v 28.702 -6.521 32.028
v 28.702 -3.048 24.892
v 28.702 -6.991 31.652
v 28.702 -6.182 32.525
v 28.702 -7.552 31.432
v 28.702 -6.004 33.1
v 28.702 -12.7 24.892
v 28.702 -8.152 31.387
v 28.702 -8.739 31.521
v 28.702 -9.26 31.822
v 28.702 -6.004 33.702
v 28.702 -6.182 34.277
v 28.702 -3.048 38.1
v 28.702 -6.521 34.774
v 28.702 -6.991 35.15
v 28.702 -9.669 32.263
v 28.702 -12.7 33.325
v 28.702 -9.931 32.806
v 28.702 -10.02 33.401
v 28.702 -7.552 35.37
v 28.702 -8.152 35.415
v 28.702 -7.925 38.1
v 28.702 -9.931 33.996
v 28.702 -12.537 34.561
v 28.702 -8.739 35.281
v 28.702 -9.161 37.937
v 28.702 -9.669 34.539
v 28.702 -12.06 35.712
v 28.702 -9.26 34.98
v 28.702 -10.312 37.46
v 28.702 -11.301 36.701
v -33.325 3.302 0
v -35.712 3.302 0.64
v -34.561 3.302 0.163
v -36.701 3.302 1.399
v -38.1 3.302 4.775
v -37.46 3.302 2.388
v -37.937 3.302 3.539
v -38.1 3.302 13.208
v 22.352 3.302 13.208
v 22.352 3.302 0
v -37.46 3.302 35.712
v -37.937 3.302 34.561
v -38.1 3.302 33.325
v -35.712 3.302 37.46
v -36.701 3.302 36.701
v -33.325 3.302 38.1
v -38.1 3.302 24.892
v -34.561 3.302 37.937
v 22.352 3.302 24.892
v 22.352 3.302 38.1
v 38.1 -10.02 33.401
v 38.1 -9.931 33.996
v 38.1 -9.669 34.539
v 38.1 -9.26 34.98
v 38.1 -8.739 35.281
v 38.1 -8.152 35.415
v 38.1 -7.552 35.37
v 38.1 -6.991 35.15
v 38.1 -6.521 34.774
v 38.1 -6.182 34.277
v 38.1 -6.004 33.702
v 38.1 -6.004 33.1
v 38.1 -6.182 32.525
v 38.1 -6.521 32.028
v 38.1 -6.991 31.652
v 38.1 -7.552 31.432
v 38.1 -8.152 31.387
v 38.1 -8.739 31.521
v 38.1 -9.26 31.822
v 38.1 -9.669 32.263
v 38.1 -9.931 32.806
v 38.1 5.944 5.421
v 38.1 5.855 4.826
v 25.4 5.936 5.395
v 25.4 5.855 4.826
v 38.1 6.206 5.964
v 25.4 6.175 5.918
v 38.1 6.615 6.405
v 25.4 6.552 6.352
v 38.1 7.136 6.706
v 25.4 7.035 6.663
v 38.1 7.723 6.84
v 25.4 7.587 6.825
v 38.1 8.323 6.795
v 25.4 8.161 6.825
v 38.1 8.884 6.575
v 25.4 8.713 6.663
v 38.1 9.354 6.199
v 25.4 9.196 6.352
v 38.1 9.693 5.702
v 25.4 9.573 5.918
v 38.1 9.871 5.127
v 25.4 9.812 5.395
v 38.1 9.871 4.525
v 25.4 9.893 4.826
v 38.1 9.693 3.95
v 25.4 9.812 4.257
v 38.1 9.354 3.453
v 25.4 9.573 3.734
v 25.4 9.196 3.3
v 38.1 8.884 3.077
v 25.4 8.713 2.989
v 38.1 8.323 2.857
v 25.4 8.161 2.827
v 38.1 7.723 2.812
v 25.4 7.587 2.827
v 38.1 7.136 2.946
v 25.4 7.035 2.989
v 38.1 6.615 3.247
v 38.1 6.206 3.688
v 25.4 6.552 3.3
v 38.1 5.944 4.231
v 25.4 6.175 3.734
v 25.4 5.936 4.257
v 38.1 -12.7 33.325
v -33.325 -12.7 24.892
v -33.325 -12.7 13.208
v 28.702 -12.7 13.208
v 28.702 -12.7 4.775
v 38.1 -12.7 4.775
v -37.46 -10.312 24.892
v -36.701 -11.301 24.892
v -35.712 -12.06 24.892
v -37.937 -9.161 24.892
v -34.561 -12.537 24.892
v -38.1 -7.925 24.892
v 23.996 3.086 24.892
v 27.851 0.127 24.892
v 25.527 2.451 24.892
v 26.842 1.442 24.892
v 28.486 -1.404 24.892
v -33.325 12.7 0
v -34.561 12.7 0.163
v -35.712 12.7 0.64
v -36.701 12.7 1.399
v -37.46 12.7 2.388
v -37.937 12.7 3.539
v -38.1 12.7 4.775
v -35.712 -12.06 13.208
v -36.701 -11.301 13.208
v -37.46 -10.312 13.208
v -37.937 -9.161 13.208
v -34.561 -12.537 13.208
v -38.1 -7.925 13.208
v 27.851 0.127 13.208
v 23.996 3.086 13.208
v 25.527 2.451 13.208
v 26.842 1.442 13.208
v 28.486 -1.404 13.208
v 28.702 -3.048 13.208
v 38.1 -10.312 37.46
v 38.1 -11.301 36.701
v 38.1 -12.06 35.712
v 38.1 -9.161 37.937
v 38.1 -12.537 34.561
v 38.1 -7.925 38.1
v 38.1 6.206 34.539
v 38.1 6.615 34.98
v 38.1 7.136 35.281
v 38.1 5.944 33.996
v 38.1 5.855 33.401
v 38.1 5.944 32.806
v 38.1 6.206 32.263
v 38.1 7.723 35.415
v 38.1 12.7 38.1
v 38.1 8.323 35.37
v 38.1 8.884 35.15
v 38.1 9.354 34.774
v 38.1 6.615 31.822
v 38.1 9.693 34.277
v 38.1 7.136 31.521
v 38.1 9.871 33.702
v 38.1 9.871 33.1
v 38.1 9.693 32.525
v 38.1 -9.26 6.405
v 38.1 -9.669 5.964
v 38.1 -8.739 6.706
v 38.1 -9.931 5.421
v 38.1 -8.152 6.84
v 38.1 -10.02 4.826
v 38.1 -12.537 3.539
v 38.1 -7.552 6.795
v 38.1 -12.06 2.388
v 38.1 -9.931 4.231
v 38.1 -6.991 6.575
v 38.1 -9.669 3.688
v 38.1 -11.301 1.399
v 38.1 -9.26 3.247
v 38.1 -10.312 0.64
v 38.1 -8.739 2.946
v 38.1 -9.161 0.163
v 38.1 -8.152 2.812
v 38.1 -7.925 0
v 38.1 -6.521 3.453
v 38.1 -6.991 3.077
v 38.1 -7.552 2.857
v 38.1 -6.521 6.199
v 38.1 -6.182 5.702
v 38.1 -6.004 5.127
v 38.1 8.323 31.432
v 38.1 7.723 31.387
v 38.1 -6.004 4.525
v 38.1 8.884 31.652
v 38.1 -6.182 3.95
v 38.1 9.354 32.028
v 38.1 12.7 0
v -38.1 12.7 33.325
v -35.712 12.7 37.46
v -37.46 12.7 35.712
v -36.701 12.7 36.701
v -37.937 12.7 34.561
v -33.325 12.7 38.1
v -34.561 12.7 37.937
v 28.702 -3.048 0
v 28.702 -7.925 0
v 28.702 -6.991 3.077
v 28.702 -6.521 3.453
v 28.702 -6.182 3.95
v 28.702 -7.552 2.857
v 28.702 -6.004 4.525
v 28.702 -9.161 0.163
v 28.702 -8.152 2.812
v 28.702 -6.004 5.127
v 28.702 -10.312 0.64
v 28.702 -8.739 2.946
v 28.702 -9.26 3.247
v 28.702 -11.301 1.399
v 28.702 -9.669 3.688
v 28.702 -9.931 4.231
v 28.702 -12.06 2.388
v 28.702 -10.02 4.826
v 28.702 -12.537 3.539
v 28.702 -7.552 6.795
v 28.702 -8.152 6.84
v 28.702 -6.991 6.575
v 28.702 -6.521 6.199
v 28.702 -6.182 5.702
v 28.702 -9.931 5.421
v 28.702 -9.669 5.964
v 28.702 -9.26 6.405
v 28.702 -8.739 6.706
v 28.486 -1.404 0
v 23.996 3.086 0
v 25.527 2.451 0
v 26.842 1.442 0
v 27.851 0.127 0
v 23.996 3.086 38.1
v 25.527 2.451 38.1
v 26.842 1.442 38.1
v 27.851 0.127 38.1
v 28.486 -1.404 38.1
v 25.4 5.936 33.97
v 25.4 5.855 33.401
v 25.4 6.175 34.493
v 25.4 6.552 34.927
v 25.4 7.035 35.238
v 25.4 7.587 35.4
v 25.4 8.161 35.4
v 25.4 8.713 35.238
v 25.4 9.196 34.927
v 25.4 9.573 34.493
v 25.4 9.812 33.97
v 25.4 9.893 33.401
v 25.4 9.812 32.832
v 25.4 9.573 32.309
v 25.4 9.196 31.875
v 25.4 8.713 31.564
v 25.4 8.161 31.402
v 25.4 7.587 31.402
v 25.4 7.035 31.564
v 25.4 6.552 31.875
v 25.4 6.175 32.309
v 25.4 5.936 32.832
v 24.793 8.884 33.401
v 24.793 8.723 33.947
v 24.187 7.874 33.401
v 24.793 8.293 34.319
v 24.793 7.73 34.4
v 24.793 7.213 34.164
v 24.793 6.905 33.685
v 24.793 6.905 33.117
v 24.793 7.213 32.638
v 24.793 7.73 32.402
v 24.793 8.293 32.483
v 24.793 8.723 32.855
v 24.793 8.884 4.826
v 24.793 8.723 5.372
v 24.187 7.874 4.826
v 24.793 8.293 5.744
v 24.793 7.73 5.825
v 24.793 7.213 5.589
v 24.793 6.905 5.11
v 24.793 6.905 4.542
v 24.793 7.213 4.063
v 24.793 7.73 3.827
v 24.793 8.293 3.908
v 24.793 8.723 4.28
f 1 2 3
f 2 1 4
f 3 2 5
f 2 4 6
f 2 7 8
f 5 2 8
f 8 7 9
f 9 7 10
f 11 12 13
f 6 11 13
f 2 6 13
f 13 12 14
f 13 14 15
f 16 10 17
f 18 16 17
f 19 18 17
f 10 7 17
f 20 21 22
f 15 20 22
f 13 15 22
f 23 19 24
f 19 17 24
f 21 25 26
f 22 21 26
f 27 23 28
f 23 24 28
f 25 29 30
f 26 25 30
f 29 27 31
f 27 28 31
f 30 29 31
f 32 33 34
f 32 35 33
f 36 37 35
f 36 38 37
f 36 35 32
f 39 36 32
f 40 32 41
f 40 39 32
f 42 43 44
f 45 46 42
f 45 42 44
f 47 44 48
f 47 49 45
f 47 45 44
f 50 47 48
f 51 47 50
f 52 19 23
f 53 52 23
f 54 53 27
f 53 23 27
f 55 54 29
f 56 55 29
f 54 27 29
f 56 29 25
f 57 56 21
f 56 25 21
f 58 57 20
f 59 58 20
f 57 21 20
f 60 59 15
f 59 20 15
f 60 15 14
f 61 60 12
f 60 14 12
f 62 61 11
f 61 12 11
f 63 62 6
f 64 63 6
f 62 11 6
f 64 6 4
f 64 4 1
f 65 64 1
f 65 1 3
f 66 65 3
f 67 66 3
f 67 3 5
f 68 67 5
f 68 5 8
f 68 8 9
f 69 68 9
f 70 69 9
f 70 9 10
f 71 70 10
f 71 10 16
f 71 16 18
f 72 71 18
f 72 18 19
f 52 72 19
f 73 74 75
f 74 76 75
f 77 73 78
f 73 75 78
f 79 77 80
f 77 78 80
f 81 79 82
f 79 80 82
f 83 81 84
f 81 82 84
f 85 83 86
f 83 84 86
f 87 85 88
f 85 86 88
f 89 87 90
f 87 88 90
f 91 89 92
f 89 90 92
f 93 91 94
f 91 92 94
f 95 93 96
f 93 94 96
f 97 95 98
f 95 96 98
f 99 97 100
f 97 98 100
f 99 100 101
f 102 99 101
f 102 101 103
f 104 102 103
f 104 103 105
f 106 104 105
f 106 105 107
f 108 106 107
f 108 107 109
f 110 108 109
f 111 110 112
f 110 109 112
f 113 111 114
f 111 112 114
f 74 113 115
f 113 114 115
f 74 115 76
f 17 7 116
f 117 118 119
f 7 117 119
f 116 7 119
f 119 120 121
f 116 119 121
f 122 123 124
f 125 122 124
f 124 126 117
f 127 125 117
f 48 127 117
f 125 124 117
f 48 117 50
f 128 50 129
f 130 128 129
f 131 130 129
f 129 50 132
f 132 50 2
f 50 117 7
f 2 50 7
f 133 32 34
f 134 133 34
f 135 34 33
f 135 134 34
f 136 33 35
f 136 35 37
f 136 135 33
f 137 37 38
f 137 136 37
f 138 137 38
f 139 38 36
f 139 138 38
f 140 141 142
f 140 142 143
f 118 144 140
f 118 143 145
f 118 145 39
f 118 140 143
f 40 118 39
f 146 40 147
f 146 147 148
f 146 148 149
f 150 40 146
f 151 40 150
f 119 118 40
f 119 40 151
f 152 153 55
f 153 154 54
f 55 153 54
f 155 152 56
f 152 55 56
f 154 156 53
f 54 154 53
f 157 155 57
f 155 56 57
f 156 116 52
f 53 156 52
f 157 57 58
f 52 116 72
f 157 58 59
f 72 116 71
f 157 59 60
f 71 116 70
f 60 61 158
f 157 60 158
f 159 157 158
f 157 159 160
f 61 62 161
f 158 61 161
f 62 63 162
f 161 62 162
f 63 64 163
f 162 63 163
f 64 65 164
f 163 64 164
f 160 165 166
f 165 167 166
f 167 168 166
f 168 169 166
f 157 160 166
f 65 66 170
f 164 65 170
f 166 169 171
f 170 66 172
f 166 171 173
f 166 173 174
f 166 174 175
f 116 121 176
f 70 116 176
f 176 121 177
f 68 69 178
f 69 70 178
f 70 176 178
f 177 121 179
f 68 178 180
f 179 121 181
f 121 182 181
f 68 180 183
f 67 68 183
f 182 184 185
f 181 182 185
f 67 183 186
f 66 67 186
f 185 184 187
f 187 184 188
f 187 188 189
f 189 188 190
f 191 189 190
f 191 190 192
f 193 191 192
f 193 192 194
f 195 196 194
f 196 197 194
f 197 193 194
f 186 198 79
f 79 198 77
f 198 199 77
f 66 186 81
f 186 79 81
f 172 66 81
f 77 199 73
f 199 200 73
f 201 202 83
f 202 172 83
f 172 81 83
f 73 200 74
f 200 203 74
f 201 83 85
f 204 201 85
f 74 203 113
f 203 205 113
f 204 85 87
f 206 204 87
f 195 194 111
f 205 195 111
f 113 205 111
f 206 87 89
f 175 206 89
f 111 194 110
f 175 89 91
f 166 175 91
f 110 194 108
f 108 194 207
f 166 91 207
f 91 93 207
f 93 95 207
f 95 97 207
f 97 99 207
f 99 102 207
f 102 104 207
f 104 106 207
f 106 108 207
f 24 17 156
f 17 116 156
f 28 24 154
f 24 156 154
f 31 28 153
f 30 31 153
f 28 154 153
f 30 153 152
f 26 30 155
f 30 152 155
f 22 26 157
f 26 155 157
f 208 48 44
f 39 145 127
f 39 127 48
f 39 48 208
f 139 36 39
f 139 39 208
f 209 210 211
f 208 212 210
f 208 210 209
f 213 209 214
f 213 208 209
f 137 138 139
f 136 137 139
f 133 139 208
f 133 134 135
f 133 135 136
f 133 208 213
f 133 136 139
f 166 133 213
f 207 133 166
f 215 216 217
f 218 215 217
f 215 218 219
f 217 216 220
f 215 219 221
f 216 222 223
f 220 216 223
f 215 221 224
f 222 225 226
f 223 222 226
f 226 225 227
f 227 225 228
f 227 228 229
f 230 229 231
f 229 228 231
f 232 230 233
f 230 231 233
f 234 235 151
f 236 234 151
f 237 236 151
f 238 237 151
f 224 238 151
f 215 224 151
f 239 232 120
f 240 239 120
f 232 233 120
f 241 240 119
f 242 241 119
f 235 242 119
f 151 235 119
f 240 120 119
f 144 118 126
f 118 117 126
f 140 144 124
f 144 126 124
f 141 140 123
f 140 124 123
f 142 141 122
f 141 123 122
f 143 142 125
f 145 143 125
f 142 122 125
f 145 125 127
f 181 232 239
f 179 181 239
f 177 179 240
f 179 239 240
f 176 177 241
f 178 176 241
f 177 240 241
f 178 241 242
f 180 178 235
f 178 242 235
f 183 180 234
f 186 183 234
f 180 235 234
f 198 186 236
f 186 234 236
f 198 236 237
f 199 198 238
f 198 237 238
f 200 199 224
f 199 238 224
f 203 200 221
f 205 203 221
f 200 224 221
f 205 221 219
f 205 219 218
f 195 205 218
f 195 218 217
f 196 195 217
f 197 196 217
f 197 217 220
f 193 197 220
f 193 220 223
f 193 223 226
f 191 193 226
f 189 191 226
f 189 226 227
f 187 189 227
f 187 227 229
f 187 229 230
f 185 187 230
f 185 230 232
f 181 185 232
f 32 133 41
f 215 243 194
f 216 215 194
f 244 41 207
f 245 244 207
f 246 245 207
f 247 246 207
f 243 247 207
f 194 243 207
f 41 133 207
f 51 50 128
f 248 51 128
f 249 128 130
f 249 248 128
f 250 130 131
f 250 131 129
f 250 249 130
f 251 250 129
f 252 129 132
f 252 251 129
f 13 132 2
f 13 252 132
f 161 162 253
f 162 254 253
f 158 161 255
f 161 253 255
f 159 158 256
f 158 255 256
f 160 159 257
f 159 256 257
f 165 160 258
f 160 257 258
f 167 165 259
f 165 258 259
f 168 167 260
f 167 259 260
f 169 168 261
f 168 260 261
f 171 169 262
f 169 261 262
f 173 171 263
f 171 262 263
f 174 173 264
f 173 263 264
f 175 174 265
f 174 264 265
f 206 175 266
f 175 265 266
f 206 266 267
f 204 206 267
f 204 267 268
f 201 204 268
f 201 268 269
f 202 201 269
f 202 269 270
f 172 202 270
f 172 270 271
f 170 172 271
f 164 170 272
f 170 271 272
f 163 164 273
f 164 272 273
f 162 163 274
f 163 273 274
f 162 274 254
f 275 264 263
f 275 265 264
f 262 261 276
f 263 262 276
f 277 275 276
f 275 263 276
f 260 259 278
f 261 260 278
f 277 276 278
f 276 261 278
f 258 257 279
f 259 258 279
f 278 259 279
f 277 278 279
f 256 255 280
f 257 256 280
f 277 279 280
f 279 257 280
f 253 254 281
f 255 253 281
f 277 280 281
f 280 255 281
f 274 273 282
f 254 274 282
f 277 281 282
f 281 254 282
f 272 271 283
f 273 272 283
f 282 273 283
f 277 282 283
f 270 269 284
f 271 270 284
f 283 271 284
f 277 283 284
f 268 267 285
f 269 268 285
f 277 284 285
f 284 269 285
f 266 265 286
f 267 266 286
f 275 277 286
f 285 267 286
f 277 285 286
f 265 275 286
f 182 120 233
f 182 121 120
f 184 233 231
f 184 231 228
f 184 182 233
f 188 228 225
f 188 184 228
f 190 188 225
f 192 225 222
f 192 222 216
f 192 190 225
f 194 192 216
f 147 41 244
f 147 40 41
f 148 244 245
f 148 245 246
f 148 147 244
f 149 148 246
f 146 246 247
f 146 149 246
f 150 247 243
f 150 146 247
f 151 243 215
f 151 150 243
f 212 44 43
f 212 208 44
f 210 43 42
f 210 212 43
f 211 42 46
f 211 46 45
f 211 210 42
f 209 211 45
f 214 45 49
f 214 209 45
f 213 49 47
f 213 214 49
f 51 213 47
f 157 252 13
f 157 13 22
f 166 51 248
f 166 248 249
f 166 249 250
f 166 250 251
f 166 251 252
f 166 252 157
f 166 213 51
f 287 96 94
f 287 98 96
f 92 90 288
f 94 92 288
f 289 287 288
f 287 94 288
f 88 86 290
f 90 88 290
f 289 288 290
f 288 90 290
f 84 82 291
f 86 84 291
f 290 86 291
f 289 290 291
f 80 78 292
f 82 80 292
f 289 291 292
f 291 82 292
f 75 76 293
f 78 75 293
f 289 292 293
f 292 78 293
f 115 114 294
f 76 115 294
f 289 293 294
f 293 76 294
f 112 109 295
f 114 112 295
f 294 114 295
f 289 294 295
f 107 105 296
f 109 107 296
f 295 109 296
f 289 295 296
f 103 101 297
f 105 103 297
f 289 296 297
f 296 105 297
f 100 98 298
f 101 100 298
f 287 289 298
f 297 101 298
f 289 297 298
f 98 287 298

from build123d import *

# Parameters (mm, degrees)
F0_W     = 76.2
F0_H     = 25.4
F1_DEPTH = 38.1
F2_W     = 66.802
F2_H     = 13.208
F3_DEPTH = 16.002
F4_R     = 6.35
F5_R     = 4.7752
F6_R     = 4.7752
F8_D     = 4.0386
F8_DEPTH = 12.7
F8_TIP   = 1.213317848


with BuildPart() as f1:
    # F0 (on Top) → F1 (new body)
    with BuildSketch(Plane.XY):
        Rectangle(F0_W, F0_H)
    extrude(amount=F1_DEPTH)

    # F2 (on face) → F3 (cut)
    with BuildSketch(Plane.XZ.offset(12.7)):
        with Locations((-4.699, 31.496)):
            Rectangle(F2_W, F2_H)
        with Locations((-4.699, 6.604)):
            Rectangle(F2_W, F2_H)
    extrude(amount=-F3_DEPTH, mode=Mode.SUBTRACT)

    # F4
    f4_edges = [f1.edges().sort_by_distance(p)[0] for p in [
        (28.702, 3.302, 6.604),
        (28.702, 3.302, 31.496),
    ]]
    fillet(f4_edges, radius=F4_R)

    # F5
    f5_edges = [f1.edges().sort_by_distance(p)[0] for p in [
        (33.401, -12.7, 38.1),
        (33.401, -12.7, 0),
    ]]
    fillet(f5_edges, radius=F5_R)

    # F6
    f6_edges = [f1.edges().sort_by_distance(p)[0] for p in [
        (-38.1, -12.7, 19.05),
        (-38.1, 8.001, 38.1),
        (-38.1, 8.001, 0),
    ]]
    fillet(f6_edges, radius=F6_R)

    # F8
    with Locations(Plane.YZ.offset(38.1)):
        with Locations((-8.001, 4.826), (-8.001, 33.401), (7.874, 33.401), (7.874, 4.826)):
            Hole(F8_D / 2, depth=F8_DEPTH)
            with Locations((0, 0, -(F8_DEPTH + F8_TIP / 2))):  # 118° drill point
                Cone(0, F8_D / 2, F8_TIP, mode=Mode.SUBTRACT)


solid = f1.part
